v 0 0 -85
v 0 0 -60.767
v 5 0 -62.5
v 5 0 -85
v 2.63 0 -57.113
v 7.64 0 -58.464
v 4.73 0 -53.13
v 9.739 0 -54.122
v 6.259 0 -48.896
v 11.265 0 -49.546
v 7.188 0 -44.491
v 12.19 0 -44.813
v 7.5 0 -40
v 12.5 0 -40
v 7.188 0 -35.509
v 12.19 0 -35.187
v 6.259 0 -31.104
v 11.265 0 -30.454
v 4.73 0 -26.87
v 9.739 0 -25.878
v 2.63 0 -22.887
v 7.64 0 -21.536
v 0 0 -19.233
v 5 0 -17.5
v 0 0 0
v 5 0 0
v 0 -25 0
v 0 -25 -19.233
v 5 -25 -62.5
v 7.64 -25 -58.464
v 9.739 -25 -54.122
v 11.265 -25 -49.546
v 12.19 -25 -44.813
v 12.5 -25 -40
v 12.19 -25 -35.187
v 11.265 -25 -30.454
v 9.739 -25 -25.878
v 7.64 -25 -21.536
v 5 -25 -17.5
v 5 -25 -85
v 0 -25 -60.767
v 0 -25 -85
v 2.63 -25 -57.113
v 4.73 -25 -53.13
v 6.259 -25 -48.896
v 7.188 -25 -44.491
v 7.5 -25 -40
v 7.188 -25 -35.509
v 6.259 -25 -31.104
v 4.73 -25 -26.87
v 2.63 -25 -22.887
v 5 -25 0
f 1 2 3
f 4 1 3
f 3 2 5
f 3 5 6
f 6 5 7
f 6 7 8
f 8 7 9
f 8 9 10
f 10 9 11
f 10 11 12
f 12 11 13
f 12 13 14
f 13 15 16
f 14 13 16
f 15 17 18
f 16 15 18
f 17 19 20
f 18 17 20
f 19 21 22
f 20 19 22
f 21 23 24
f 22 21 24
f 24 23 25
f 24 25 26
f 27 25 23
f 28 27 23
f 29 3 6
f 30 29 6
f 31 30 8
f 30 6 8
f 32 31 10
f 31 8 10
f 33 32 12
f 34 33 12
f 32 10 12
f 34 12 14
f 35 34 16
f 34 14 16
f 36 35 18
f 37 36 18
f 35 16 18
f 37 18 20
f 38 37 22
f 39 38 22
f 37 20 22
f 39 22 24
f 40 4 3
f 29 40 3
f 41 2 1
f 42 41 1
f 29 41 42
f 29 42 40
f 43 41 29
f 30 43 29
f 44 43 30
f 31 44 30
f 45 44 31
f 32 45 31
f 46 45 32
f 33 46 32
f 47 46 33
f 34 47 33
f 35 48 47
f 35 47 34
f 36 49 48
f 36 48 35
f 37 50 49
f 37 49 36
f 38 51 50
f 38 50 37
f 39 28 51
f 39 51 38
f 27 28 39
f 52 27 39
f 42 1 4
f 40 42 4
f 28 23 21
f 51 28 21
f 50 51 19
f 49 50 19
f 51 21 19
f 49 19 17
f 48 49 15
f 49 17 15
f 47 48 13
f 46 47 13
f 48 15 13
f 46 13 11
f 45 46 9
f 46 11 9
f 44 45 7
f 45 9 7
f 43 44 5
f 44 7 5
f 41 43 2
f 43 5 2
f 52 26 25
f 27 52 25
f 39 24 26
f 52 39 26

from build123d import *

# Parameters (mm, degrees)
F1_DEPTH = 25


with BuildPart() as f1:
    # F0 (on Front) → F1 (new body)
    with BuildSketch(Plane.XZ):
        with BuildLine():
            Line((5, 0), (0, 0))
            Line((0, 0), (0, -19.23344))
            ThreePointArc((0, -19.23344), (7.5, -40), (0, -60.76656))
            Line((0, -60.76656), (0, -85))
            Line((0, -85), (5, -85))
            Line((5, -85), (5, -62.5))
            ThreePointArc((5, -62.5), (12.5, -40), (5, -17.5))
            Line((5, -17.5), (5, 0))
        make_face()
    extrude(amount=F1_DEPTH)


solid = f1.part
